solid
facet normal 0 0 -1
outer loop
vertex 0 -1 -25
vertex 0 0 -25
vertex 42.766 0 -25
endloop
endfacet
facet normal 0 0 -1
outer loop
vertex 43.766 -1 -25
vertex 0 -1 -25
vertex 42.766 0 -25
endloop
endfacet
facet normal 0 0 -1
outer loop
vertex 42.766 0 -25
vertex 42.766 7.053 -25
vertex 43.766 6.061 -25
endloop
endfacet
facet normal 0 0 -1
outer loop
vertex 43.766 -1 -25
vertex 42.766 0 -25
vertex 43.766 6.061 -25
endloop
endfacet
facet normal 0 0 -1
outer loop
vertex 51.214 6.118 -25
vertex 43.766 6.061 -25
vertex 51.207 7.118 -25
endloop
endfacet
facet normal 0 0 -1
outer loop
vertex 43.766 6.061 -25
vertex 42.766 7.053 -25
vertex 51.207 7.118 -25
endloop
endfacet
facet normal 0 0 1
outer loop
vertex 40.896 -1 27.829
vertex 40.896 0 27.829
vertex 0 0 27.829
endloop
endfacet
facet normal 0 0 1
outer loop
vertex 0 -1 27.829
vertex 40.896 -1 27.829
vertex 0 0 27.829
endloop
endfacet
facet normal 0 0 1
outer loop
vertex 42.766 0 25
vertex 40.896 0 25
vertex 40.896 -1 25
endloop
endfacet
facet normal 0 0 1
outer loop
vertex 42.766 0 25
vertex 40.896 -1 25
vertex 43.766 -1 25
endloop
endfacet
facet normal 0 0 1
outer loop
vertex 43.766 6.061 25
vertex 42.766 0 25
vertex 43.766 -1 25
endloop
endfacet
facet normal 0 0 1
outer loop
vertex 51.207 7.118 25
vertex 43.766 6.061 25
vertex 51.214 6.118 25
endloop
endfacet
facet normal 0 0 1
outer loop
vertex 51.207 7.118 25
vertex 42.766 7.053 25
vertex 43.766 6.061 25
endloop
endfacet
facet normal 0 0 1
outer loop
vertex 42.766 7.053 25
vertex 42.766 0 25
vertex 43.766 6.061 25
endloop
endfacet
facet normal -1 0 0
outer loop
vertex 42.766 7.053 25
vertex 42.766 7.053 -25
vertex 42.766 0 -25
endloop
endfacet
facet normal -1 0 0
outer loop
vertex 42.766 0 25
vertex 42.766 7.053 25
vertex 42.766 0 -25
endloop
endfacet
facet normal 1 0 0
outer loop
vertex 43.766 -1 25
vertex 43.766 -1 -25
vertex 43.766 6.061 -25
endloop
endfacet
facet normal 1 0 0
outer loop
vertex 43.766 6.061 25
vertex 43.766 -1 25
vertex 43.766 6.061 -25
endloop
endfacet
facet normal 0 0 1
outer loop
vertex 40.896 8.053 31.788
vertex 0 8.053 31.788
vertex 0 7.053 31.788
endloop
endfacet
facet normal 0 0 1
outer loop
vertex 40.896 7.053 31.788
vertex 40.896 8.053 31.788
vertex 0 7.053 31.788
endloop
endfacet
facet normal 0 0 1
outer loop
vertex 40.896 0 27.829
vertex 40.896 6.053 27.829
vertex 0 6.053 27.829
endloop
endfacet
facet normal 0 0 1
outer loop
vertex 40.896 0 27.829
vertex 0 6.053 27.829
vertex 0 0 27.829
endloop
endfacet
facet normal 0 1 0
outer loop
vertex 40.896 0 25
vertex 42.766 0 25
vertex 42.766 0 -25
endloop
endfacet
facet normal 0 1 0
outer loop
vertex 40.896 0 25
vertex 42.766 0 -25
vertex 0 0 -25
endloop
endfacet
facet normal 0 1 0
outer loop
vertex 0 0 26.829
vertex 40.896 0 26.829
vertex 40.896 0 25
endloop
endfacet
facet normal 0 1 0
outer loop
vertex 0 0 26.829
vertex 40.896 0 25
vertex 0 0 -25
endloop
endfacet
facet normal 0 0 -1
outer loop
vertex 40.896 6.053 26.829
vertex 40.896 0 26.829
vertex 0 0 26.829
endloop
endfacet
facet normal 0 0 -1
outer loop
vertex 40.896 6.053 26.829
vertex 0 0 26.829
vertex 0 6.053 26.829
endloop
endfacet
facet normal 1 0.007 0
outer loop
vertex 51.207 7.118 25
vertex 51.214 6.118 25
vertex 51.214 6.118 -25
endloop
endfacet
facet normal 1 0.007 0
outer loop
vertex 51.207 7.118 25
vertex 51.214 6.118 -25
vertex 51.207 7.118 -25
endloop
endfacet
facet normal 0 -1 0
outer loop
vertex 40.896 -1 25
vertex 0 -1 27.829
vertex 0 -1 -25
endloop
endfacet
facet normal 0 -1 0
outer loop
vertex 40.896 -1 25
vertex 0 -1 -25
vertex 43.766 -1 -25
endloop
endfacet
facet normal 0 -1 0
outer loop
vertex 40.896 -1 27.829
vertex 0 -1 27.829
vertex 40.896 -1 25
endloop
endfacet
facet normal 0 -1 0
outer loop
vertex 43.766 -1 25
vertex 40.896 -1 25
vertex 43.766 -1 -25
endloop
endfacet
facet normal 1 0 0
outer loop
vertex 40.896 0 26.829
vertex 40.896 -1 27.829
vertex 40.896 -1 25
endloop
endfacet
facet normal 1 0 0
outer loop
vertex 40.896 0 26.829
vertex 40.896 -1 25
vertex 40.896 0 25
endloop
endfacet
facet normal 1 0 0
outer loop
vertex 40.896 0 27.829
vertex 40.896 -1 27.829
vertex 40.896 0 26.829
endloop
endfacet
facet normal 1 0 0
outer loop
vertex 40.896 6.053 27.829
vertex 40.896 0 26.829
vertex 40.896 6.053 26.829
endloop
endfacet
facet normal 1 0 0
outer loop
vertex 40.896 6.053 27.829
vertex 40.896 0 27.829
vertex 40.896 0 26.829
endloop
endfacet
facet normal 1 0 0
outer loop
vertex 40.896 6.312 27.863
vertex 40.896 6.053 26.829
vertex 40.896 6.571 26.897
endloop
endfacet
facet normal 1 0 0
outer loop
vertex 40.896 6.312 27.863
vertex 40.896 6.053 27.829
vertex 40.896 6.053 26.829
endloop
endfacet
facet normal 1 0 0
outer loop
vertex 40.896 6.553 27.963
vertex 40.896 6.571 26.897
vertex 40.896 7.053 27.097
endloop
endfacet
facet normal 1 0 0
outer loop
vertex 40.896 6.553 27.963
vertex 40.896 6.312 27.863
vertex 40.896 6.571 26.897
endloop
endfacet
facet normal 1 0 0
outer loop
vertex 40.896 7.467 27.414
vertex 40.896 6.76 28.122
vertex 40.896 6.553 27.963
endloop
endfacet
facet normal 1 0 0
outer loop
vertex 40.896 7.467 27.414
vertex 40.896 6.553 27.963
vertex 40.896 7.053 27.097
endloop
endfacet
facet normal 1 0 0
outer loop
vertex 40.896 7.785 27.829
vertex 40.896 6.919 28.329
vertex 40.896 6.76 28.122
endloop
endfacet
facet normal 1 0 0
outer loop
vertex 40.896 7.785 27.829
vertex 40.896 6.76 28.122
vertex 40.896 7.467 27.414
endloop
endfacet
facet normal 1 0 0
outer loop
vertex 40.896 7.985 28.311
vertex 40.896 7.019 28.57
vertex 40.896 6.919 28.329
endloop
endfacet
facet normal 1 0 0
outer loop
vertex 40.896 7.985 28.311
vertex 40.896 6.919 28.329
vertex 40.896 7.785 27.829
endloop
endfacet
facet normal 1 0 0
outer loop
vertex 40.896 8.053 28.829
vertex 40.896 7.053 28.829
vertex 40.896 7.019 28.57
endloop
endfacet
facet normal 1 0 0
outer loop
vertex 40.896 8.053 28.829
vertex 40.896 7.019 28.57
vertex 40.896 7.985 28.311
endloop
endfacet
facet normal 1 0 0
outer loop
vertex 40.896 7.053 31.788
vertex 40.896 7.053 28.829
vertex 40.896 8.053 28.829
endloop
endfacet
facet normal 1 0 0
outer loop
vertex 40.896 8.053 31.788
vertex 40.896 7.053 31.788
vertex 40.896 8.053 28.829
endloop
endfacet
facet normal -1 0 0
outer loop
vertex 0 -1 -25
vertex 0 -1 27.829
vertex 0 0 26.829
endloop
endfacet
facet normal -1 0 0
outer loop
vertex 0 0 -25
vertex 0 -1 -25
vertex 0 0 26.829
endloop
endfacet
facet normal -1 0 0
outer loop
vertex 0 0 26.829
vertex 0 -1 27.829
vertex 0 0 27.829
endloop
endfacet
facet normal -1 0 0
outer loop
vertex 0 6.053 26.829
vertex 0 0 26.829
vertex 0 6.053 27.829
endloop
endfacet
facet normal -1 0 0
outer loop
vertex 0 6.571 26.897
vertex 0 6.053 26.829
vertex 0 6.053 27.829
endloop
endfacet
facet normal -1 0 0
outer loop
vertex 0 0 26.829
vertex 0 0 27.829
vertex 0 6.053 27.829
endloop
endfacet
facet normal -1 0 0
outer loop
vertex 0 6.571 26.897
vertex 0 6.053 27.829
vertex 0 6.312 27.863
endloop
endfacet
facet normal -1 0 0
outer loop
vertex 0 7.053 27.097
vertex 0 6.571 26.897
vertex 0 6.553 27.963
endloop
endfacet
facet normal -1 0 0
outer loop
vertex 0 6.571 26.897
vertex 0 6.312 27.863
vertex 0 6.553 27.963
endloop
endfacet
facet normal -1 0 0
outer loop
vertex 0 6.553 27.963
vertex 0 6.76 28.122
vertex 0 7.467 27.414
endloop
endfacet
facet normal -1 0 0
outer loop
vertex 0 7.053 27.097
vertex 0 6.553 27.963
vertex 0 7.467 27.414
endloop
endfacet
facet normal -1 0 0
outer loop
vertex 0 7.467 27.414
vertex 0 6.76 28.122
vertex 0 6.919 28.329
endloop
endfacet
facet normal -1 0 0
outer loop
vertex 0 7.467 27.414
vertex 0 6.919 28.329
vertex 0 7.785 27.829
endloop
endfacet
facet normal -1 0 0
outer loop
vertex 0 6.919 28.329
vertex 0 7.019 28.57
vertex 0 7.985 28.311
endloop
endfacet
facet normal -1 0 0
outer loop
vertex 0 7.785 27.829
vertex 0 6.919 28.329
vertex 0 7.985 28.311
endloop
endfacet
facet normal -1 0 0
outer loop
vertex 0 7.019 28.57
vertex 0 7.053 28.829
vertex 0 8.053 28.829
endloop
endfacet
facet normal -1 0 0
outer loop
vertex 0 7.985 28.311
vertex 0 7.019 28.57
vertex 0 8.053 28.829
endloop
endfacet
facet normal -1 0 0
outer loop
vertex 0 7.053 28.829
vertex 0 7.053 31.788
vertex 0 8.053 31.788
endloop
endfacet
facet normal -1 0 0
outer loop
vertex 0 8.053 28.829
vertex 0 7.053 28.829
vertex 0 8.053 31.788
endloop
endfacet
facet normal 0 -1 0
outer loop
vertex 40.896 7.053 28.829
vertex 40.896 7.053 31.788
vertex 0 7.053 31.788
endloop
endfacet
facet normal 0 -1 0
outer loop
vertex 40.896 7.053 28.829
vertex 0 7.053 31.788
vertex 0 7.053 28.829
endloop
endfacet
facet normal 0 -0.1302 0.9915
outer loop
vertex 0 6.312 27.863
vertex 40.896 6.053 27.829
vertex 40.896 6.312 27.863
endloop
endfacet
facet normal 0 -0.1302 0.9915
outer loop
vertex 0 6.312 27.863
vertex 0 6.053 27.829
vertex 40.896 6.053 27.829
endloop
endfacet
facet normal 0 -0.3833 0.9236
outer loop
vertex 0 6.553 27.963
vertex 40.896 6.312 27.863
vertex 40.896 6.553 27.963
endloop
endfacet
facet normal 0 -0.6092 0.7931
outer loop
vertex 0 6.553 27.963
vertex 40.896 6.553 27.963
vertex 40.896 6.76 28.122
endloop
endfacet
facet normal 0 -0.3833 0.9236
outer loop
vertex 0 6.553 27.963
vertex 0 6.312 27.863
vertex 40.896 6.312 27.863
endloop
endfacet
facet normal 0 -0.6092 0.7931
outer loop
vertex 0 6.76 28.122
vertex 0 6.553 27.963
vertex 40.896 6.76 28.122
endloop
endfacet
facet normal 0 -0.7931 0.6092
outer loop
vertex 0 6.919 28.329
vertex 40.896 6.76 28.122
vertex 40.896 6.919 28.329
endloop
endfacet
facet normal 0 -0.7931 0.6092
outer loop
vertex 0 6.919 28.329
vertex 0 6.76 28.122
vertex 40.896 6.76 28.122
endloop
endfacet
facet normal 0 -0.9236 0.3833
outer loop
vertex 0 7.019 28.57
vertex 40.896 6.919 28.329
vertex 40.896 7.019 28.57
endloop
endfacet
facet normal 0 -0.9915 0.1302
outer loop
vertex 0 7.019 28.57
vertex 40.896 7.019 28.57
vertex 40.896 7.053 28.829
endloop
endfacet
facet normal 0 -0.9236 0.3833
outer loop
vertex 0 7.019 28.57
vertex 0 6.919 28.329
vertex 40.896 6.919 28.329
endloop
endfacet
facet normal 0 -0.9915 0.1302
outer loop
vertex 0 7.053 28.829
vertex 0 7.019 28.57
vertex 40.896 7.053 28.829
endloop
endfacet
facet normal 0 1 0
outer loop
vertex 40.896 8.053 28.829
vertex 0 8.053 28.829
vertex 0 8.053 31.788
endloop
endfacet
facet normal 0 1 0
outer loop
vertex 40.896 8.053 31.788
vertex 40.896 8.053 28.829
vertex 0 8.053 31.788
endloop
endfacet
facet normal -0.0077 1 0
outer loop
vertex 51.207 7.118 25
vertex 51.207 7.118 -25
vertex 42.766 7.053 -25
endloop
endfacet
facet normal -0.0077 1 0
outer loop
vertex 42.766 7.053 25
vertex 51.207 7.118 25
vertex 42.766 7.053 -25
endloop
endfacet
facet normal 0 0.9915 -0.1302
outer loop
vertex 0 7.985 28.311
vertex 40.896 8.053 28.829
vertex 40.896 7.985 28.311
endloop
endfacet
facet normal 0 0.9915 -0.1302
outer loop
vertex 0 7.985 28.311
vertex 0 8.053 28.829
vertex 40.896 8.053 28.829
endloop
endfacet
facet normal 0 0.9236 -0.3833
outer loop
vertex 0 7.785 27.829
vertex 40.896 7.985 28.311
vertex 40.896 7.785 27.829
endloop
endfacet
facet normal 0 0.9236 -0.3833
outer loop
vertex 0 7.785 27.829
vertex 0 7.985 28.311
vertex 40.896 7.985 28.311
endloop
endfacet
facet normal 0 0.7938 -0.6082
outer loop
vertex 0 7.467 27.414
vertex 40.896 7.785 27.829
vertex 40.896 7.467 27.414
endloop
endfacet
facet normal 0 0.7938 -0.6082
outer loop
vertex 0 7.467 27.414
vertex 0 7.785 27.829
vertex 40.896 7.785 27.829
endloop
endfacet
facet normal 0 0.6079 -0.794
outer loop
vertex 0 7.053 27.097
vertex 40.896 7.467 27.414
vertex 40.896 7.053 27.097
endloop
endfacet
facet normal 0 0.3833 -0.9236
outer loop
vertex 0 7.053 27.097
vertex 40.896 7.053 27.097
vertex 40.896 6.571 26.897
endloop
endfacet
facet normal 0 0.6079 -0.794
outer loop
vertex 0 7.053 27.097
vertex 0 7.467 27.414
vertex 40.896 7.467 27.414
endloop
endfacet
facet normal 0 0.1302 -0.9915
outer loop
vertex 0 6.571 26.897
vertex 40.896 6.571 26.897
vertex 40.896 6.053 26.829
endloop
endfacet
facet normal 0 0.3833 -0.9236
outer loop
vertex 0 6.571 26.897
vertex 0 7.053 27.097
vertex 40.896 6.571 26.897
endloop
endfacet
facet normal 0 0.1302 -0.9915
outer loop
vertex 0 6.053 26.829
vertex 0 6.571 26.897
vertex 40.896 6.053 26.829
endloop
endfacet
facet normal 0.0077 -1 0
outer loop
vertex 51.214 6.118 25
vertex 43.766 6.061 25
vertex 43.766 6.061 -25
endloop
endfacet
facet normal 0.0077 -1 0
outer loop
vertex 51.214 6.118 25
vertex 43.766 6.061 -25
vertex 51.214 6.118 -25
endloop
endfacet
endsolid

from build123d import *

# Parameters (mm, degrees)
F1_DEPTH = 25
F2_W     = 40.895786
F2_H     = 2.828645
F3_DEPTH = 1
F5_DEPTH = 40.895786
F6_R     = 1
F7_R     = 2


with BuildPart() as f1:
    # F0 (on Top) → F1 (new body, symmetric)
    with BuildSketch(Plane.XY):
        Polygon((42.765886, 0), (0, 0), (0, -1), (43.765886, -1), (43.765886, 6.060815), (51.214214, 6.117835), (51.206559, 7.117806), (42.765886, 7.053189), align=None)
    extrude(amount=F1_DEPTH, both=True)

    # F2 (on face) → F3 (join, through all)
    with BuildSketch(Plane(origin=(0, 0, 0), x_dir=(-1, 0, 0), z_dir=(0, 1, 0))):
        with Locations((-20.447893, 26.414322)):
            Rectangle(F2_W, F2_H)
    extrude(amount=-F3_DEPTH)

    # F4 (on face) → F5 (join, through all)
    with BuildSketch(Plane.YZ.offset(40.895786)):
        Polygon((7.053189, 27.828645), (0, 27.828645), (0, 26.828645), (8.053189, 26.828645), (8.053189, 31.7876), (7.053189, 31.7876), align=None)
    extrude(amount=-F5_DEPTH)

    # F6
    f6_edges = [f1.edges().sort_by_distance(p)[0] for p in [
        (20.447893, 7.053189, 27.828645),
    ]]
    fillet(f6_edges, radius=F6_R)

    # F7
    f7_edges = [f1.edges().sort_by_distance(p)[0] for p in [
        (20.447893, 8.053189, 26.828645),
    ]]
    fillet(f7_edges, radius=F7_R)


solid = f1.part
